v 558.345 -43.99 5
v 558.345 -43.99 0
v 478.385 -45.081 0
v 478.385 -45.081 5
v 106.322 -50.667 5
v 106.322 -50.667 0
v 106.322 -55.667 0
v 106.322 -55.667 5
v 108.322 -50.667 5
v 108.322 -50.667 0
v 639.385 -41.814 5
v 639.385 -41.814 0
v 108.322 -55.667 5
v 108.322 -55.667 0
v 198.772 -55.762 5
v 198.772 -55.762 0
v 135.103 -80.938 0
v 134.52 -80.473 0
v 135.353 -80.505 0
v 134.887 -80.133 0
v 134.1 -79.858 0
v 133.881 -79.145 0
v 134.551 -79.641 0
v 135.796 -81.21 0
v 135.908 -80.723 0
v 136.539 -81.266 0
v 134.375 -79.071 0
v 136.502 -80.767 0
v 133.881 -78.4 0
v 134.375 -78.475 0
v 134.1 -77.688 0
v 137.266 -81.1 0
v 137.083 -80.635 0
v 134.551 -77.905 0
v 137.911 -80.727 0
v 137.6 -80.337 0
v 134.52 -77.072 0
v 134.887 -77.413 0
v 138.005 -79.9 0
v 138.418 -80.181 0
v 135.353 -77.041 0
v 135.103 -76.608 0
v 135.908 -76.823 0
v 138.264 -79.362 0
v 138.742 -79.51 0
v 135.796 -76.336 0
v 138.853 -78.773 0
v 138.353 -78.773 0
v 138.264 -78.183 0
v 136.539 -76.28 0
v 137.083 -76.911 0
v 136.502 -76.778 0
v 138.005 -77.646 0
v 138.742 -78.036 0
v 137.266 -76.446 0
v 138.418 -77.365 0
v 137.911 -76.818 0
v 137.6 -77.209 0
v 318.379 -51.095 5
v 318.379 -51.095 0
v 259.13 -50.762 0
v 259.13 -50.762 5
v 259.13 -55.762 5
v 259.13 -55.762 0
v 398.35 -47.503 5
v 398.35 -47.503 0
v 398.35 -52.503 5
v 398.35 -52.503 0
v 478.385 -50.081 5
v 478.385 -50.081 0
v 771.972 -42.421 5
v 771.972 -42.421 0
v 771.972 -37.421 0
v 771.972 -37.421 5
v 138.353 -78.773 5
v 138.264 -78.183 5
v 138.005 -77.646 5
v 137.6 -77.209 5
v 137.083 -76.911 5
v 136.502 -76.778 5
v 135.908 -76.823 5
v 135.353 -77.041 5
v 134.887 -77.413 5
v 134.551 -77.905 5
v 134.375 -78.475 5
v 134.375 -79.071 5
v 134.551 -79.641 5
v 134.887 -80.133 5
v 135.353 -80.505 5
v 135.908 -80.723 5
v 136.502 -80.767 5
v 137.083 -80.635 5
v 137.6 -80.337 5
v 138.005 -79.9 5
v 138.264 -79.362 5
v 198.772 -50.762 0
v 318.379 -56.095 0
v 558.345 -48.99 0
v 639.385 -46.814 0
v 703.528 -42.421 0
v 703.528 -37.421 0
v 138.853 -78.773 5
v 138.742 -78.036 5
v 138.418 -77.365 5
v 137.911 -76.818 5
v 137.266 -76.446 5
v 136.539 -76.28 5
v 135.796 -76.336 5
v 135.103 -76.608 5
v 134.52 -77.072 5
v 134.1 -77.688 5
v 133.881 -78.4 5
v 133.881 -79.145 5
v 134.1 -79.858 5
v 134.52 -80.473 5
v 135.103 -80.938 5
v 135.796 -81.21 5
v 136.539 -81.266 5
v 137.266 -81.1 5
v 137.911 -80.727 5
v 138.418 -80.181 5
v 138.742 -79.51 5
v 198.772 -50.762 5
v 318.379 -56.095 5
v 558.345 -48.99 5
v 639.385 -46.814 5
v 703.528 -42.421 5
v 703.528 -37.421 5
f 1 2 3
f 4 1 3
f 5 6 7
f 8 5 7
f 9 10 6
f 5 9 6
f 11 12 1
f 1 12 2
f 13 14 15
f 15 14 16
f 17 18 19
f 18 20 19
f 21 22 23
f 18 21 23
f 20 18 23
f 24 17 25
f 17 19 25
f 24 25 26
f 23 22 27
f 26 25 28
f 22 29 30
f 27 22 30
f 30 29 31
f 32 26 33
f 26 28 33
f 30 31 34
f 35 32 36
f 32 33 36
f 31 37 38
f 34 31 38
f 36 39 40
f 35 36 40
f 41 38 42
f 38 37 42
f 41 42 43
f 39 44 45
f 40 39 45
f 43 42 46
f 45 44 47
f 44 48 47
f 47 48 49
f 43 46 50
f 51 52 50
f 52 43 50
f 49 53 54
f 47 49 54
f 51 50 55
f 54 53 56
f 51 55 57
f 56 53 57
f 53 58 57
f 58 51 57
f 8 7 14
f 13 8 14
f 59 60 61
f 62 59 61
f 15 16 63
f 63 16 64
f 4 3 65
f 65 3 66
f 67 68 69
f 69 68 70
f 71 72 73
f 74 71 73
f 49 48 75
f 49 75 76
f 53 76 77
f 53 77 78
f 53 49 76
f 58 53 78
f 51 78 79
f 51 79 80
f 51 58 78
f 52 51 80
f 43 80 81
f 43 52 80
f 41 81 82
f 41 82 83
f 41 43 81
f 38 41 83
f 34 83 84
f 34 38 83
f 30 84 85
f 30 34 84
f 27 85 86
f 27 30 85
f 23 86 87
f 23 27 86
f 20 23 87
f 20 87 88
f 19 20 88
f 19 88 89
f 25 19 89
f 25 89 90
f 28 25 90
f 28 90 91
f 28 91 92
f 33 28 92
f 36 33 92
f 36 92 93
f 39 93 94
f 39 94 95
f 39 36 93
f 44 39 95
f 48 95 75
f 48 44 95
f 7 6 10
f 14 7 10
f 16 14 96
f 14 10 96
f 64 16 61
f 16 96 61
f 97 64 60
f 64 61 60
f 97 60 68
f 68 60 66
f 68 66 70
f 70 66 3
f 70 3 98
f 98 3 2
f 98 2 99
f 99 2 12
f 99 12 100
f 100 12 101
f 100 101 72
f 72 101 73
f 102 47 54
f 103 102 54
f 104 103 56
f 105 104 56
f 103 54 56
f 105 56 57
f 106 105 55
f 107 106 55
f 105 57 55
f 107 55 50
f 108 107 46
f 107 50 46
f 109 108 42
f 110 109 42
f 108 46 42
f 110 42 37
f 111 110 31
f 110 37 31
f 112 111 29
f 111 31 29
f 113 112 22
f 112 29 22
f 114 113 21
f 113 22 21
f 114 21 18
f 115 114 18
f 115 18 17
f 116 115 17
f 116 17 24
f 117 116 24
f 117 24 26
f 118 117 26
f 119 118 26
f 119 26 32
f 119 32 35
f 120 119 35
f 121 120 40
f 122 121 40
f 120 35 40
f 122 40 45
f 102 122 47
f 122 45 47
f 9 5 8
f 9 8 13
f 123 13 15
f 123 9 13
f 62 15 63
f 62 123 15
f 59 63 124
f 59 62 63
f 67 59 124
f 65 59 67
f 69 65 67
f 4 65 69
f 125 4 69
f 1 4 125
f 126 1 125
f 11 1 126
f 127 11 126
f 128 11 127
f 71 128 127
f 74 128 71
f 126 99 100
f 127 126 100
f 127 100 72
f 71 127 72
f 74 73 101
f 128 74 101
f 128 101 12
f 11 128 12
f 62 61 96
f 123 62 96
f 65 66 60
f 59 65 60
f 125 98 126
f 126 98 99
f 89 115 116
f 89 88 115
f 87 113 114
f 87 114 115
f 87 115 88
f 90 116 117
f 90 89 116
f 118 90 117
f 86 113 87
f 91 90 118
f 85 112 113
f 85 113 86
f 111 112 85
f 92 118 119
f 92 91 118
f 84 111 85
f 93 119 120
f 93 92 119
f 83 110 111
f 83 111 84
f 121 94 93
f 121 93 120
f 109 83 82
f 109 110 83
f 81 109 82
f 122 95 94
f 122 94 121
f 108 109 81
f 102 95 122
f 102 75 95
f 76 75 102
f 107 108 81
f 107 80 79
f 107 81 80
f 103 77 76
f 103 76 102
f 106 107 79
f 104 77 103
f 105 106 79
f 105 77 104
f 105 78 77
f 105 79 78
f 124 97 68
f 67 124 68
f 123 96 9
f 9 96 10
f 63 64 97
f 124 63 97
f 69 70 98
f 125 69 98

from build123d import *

# Parameters (mm, degrees)
MODEL_R           = 2.5
MODEL_R_2         = 2
EXTRUDE_1_DEPTH   = 5
EXTRUDE_1_2_DEPTH = 5


with BuildPart() as part:
    # Model → 凸台-拉伸1 (new body)
    with BuildSketch(Plane.XY):
        with Locations((136.352657781, -78.772888915)):
            Circle(MODEL_R)
        with Locations((136.352657781, -78.772888915)):
            Circle(MODEL_R_2, mode=Mode.SUBTRACT)
    extrude(amount=EXTRUDE_1_DEPTH)


with BuildPart() as body_2:
    # Model → Extrude 1 2 (new body)
    with BuildSketch(Plane.XY):
        Polygon((639.385053073, -46.813763988), (703.528398771, -42.42077719), (771.971701744, -42.42077719), (771.971701744, -37.42077719), (703.528398771, -37.42077719), (639.385053073, -41.813763988), (558.344709294, -43.989749553), (478.385053073, -45.081007644), (398.350063341, -47.503171379), (318.379120522, -51.094565155), (259.129657458, -50.761885212), (198.772250415, -50.761885212), (108.322443372, -50.666524546), (106.322443372, -50.666524546), (106.322443372, -55.666524546), (108.322443372, -55.666524546), (198.772250415, -55.761885212), (259.129657458, -55.761885212), (318.379120522, -56.094565155), (398.350063341, -52.503171379), (478.385053073, -50.081007644), (558.344709294, -48.989749553), align=None)
    extrude(amount=EXTRUDE_1_2_DEPTH)


solid = Compound([part.part, body_2.part])
